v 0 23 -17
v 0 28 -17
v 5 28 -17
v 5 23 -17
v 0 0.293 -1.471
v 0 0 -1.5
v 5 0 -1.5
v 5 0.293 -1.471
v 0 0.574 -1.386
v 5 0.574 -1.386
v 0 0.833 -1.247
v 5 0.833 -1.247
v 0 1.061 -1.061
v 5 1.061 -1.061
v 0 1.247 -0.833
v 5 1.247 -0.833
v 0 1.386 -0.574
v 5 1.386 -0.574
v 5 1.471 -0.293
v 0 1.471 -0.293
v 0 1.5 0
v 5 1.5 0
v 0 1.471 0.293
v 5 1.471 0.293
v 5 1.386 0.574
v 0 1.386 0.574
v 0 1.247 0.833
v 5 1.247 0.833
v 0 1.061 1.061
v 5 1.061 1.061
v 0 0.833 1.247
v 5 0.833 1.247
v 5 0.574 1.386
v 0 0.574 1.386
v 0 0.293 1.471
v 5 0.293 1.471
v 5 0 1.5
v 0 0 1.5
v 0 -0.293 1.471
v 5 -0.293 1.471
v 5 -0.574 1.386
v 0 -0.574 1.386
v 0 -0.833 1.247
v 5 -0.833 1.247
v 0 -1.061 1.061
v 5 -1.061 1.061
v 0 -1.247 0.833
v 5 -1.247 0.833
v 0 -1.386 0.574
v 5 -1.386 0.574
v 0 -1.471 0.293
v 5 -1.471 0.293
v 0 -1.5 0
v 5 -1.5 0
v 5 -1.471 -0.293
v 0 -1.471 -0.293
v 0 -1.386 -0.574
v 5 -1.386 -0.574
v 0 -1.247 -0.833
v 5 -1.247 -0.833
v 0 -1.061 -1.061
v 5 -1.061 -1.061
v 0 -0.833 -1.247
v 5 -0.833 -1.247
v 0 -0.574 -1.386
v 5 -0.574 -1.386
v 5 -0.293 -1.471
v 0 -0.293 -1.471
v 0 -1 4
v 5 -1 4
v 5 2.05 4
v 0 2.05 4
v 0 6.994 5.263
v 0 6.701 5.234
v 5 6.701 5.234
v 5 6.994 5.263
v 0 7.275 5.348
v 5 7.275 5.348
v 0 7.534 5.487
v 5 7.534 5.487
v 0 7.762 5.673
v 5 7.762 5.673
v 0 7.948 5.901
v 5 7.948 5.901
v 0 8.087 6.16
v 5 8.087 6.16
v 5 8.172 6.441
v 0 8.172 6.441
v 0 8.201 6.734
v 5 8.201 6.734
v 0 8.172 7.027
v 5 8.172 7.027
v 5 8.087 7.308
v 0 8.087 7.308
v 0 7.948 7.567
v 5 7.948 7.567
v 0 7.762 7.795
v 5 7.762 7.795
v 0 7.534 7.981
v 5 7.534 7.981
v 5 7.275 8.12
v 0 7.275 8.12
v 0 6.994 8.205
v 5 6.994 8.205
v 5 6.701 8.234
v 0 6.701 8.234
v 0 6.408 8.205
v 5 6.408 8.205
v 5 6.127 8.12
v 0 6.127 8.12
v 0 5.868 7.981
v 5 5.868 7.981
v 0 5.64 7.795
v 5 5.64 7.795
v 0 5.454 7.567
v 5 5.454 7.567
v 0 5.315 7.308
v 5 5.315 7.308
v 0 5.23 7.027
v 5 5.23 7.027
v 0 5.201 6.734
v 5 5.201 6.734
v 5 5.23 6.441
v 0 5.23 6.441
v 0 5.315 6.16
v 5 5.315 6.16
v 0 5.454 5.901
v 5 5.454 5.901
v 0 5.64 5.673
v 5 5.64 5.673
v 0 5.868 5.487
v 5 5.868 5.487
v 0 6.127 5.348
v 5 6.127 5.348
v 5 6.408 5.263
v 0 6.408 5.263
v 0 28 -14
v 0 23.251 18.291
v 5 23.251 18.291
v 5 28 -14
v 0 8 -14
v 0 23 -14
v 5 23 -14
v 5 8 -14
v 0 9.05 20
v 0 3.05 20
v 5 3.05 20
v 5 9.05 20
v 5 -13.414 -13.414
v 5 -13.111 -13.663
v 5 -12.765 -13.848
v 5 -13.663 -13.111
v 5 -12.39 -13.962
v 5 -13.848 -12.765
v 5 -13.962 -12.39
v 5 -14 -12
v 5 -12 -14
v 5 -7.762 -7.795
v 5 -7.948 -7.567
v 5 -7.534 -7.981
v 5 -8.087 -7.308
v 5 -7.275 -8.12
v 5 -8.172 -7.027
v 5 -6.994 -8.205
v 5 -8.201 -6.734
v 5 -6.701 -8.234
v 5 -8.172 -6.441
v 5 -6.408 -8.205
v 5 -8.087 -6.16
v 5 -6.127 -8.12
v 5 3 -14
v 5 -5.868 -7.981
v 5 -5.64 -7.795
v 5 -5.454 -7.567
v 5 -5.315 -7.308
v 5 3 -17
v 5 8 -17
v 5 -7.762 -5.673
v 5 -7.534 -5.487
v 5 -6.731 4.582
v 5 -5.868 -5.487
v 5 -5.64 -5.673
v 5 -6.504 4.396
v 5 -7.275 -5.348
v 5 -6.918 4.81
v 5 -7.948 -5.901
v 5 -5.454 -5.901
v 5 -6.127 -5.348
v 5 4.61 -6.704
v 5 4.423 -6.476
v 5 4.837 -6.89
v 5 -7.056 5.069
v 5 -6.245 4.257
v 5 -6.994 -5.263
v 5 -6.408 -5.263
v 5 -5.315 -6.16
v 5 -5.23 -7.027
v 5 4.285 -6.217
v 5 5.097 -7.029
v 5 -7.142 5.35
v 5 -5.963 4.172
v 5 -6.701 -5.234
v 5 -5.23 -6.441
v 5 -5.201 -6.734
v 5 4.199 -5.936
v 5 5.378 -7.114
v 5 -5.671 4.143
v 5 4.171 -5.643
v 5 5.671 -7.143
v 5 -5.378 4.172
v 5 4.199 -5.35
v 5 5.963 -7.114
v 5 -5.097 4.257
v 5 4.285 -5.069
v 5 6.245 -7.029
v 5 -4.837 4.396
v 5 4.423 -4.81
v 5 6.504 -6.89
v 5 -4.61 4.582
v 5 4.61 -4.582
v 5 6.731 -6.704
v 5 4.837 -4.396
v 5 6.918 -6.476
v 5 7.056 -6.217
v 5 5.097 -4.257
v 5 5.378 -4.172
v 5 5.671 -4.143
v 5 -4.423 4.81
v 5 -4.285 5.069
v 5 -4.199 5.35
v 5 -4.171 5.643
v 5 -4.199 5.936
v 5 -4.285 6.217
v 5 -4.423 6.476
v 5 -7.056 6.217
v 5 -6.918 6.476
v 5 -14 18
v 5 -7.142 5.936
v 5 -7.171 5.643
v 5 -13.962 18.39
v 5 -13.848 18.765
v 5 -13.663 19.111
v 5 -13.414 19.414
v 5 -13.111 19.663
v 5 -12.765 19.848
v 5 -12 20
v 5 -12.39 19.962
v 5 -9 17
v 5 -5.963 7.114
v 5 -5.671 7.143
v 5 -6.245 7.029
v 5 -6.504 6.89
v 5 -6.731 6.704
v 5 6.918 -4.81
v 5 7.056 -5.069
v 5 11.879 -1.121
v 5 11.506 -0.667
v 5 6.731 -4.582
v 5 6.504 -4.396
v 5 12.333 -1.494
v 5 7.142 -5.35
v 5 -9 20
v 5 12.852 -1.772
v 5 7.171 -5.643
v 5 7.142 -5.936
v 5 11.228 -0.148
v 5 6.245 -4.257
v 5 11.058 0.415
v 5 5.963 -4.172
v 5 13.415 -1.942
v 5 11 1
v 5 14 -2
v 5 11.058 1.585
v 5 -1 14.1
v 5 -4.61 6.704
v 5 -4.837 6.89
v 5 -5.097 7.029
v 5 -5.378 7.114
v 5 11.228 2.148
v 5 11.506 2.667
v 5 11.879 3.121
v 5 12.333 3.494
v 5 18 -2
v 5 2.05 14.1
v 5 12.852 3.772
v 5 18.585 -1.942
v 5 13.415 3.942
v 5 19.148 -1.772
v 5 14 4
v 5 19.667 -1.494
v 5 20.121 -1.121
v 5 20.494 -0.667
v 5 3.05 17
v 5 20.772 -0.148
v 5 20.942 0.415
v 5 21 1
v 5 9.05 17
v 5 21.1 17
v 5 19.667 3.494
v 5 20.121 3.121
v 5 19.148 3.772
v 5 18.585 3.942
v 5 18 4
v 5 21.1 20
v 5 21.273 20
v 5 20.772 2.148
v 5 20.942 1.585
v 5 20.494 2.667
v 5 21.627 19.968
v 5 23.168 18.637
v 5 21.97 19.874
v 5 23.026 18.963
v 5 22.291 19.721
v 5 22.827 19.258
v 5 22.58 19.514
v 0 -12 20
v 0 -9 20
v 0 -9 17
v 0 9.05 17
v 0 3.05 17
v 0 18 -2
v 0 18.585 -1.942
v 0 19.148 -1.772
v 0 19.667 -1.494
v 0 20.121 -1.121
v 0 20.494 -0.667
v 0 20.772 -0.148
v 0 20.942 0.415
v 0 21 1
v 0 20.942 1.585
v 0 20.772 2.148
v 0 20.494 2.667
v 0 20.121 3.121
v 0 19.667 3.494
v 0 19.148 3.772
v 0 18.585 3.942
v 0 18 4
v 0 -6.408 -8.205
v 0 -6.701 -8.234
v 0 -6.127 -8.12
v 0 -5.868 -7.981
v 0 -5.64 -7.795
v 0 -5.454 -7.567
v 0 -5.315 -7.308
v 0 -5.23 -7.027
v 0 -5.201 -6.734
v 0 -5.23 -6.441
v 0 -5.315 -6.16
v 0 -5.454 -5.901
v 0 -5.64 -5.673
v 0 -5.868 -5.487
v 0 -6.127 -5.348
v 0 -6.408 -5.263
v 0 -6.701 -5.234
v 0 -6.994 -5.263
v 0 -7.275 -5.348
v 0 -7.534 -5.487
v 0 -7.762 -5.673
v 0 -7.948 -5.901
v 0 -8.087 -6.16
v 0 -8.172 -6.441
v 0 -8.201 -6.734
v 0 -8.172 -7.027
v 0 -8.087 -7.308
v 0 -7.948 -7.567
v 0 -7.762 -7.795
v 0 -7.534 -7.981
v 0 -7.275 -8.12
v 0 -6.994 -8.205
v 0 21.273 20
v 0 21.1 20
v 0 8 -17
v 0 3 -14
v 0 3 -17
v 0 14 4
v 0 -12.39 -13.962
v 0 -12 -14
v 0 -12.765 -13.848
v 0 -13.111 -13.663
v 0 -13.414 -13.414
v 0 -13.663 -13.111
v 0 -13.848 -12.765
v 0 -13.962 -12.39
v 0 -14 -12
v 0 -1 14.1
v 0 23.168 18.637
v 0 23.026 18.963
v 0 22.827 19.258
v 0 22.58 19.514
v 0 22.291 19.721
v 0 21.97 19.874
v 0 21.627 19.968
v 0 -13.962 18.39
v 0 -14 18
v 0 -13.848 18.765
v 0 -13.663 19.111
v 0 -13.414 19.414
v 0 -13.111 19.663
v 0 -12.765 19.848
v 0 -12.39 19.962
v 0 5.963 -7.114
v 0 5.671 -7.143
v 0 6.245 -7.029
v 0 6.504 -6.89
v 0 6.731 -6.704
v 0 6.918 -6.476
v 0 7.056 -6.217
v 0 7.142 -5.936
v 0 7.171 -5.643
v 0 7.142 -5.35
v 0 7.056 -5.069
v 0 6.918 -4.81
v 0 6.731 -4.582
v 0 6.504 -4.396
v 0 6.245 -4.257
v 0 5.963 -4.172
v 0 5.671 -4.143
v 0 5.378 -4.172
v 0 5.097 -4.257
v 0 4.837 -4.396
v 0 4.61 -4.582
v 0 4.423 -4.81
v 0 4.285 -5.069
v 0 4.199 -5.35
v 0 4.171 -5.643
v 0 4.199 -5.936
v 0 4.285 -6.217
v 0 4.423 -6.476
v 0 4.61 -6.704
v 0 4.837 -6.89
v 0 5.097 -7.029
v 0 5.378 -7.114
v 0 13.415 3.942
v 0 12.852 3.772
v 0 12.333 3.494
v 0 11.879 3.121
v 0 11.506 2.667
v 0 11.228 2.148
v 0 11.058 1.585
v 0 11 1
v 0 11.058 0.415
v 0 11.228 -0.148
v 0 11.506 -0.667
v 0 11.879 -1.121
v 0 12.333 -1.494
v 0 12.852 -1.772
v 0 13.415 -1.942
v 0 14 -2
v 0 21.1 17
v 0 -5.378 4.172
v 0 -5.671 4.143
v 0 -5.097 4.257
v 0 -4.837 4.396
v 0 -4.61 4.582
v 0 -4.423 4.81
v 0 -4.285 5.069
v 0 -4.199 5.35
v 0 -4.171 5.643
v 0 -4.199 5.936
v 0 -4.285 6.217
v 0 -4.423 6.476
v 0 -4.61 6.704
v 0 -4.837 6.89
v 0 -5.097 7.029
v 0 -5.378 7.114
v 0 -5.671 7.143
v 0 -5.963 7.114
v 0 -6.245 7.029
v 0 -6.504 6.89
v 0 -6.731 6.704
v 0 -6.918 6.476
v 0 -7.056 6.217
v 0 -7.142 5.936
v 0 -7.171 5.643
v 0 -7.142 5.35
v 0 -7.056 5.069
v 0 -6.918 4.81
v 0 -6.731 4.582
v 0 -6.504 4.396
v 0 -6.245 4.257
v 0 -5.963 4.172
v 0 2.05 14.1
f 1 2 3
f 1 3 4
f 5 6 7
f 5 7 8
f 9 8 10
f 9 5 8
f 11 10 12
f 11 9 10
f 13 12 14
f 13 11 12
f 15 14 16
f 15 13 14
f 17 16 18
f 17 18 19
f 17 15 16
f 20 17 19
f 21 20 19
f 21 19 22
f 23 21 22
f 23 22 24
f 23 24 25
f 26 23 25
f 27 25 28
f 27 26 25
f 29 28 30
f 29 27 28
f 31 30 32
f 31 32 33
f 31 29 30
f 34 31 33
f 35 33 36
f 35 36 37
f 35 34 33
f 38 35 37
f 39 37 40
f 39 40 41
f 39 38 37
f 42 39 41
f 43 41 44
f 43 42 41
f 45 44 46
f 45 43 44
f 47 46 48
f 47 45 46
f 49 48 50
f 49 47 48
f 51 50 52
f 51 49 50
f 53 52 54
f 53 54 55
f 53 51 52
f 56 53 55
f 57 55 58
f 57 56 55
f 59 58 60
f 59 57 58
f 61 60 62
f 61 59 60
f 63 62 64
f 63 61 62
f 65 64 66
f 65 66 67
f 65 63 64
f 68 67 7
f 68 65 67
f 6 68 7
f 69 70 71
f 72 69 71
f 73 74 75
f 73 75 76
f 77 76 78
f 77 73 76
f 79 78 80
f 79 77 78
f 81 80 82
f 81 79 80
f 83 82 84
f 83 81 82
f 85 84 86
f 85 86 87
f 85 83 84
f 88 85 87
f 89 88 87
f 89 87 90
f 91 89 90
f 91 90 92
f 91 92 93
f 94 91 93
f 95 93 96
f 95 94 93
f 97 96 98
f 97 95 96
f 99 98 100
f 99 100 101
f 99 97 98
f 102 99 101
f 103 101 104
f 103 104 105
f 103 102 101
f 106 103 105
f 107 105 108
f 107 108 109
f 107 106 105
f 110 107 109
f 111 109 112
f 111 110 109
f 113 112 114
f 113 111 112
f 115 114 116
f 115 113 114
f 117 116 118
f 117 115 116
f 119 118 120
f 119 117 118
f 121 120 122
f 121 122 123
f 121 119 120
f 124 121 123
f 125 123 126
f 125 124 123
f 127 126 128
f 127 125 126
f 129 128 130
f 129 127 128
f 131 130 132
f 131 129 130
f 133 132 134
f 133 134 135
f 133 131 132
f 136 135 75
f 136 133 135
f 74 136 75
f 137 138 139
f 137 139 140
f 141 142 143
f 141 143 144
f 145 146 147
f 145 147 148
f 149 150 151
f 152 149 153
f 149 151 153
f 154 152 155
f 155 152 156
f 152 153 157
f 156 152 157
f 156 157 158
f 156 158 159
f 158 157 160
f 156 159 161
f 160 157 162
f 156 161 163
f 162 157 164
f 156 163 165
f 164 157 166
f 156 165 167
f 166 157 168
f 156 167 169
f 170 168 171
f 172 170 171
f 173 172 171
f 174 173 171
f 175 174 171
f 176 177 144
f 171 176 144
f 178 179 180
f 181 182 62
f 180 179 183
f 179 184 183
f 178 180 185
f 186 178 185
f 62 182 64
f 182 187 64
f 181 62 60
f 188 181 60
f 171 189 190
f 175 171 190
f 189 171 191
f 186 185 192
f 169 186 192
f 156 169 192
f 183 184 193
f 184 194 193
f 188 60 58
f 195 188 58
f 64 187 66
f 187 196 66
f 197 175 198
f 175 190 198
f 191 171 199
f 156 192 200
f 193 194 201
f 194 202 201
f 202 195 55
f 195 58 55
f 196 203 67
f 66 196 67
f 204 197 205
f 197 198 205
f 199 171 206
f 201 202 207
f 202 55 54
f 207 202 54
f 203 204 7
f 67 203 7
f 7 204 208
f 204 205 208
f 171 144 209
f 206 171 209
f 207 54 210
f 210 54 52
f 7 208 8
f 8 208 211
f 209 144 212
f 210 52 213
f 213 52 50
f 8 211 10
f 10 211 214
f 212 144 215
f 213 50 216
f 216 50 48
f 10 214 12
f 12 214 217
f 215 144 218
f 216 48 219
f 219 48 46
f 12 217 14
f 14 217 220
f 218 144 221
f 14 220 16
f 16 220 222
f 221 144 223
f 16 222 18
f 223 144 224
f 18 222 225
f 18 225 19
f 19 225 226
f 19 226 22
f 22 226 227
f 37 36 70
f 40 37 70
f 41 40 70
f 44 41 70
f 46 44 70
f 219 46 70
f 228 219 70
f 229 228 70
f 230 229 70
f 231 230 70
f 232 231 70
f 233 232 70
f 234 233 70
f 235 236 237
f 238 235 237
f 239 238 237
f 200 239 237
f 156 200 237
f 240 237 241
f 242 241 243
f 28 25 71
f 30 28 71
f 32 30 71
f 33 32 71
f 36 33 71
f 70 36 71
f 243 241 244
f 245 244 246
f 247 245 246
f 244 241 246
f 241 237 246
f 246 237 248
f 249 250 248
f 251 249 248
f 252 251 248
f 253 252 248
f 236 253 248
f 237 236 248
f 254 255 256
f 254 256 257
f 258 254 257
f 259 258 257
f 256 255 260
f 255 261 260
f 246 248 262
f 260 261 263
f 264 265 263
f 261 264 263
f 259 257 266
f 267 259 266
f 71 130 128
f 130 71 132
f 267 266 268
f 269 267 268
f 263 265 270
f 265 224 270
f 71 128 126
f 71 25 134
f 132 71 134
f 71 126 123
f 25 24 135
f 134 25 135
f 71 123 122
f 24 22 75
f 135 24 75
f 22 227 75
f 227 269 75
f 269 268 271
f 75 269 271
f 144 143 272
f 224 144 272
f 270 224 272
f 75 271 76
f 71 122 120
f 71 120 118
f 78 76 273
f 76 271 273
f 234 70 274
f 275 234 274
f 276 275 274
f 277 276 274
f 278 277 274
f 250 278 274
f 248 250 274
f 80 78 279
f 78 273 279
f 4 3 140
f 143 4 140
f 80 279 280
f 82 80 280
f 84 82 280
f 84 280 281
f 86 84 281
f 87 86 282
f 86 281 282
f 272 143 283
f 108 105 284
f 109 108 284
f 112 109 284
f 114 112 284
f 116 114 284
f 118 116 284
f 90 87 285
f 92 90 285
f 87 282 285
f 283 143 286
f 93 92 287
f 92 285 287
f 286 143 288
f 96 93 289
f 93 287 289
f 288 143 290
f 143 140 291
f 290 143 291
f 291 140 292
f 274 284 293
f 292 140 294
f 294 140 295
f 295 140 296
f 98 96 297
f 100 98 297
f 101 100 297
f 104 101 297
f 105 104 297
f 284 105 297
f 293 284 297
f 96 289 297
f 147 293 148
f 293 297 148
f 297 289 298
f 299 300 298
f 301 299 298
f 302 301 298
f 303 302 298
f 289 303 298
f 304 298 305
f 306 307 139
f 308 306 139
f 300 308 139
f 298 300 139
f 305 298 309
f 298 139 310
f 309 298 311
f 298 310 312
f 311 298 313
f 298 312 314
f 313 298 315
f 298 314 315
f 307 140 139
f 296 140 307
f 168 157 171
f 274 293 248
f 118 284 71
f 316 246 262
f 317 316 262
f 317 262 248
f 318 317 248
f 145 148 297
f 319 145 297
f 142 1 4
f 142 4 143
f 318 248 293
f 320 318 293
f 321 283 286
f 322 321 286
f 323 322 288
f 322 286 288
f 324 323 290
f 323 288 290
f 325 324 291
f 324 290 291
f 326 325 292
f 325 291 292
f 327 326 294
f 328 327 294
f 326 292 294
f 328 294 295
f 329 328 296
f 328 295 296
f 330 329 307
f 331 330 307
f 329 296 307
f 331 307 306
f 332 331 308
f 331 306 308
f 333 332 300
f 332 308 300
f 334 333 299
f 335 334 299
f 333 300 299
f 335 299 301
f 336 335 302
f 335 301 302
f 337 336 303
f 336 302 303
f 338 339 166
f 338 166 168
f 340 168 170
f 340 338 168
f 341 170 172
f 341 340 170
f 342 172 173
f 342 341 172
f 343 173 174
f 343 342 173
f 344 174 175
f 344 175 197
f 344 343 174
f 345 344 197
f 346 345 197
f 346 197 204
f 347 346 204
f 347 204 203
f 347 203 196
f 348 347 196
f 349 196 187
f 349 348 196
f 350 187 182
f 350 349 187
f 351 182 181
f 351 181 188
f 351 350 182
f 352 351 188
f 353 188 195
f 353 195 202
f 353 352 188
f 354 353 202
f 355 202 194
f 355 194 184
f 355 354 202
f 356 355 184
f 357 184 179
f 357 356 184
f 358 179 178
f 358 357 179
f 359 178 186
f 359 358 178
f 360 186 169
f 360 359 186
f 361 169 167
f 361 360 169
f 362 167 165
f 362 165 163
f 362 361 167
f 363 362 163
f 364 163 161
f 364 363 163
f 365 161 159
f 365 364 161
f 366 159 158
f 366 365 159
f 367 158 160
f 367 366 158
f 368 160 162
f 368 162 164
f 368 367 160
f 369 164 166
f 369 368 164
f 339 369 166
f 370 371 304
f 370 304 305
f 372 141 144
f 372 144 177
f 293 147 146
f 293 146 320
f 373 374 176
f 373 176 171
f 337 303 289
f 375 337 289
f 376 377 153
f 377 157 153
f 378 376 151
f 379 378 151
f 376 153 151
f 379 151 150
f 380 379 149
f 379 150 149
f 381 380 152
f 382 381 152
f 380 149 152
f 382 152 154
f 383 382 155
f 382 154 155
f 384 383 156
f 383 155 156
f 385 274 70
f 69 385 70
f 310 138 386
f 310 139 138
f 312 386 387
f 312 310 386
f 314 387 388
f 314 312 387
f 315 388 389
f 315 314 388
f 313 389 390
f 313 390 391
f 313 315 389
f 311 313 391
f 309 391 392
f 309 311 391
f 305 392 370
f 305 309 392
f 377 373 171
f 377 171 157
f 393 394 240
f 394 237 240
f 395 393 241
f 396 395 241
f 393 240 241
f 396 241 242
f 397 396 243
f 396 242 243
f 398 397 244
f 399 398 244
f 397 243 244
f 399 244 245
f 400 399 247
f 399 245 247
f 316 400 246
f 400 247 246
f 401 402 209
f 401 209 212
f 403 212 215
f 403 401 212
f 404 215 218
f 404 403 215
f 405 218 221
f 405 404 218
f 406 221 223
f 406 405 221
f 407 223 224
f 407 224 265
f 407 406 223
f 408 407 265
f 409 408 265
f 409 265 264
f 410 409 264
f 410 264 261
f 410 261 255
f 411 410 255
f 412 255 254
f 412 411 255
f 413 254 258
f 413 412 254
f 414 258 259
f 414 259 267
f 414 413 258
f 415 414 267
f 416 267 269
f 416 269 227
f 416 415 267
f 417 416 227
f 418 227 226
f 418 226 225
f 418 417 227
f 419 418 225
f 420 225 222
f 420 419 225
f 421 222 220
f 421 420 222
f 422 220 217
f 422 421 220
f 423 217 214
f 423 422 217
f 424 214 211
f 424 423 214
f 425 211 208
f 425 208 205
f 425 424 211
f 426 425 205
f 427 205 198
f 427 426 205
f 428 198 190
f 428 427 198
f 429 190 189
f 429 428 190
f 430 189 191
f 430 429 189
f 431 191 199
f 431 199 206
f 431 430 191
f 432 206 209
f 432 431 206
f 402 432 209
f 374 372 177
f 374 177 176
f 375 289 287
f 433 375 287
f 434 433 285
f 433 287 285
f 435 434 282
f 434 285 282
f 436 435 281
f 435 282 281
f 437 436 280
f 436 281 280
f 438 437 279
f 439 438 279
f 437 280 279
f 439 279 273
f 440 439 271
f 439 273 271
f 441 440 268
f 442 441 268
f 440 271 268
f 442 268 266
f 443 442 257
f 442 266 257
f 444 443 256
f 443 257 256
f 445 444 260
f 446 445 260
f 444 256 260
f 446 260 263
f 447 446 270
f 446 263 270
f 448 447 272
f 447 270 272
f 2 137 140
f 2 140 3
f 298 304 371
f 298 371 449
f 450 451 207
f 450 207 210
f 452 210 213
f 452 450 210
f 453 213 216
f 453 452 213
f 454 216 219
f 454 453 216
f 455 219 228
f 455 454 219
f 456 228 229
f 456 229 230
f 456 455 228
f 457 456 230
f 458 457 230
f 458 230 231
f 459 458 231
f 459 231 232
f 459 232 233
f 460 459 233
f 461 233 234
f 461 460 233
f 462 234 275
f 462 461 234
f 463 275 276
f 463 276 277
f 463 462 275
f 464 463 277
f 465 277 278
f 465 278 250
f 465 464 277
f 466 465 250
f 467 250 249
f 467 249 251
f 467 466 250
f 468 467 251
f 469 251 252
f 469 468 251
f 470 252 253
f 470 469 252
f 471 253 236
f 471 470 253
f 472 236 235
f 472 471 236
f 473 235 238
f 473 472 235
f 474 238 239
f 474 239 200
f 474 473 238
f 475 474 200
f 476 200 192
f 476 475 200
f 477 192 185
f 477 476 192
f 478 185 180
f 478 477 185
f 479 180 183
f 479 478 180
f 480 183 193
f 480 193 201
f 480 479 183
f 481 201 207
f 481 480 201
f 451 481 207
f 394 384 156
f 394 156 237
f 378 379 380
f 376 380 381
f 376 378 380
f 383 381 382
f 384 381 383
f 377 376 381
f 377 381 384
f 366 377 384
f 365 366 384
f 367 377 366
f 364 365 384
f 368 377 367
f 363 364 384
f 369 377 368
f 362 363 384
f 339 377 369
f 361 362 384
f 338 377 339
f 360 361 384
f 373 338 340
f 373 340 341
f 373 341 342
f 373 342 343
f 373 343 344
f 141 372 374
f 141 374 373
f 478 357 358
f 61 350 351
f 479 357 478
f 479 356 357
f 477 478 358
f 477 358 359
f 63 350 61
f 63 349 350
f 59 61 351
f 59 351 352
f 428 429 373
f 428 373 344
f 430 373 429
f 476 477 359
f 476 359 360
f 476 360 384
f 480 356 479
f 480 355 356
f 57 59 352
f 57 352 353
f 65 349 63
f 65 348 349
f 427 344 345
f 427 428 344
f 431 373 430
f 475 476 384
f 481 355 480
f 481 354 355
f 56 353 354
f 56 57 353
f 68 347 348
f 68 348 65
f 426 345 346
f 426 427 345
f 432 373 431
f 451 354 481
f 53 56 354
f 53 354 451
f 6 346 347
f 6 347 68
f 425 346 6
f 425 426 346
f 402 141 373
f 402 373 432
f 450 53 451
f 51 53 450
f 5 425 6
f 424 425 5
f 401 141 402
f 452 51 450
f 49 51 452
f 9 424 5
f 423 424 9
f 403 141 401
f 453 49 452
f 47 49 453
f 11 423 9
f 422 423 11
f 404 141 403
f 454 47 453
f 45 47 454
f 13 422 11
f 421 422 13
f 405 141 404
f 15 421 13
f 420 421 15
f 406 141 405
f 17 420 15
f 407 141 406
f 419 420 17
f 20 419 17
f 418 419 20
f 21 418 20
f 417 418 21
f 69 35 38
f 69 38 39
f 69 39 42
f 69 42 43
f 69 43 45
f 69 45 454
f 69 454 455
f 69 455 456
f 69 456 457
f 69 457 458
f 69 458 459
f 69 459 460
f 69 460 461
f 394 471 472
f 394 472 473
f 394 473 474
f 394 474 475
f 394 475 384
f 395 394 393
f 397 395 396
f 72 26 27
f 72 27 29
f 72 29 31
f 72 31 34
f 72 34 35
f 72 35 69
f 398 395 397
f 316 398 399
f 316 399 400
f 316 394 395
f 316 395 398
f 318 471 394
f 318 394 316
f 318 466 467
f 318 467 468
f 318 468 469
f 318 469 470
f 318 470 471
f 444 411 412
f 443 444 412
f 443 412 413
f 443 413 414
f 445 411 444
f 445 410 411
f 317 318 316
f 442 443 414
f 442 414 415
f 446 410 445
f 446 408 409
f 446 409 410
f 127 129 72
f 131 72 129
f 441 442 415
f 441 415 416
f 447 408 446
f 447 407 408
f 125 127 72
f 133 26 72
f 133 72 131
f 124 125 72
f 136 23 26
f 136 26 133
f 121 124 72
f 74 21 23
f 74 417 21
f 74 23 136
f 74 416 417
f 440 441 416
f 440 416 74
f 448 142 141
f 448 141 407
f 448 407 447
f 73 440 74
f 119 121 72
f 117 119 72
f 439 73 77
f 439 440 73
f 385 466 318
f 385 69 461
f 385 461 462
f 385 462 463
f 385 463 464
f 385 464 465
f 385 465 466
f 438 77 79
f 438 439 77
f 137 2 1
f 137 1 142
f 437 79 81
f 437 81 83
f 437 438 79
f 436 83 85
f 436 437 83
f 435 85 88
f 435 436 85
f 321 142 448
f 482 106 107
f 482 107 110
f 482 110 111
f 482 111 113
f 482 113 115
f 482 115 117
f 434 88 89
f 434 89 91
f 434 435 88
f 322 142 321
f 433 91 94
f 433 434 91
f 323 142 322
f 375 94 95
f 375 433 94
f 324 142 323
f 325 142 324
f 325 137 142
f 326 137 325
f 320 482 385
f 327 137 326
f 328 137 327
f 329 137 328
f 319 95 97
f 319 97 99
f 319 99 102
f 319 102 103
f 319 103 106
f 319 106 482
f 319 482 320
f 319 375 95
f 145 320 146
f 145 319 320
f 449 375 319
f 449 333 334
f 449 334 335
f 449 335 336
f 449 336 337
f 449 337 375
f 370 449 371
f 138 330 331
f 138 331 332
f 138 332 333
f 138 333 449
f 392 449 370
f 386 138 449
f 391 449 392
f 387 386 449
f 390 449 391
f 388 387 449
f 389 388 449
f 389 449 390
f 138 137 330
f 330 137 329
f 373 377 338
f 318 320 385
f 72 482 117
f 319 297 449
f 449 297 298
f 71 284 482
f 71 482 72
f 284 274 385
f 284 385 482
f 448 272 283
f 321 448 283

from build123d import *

# Parameters (mm, degrees)
SKETCH1_R           = 1.5
BOSS_EXTRUDE1_DEPTH = 5
SKETCH2_W           = 3
SKETCH2_H           = 12.05
SKETCH2_W_2         = 10.1
SKETCH2_H_2         = 3.05
CUT_EXTRUDE1_DEPTH  = 35.770677301
CUT_EXTRUDE3_DEPTH  = 10
FILLET1_R           = 2


with BuildPart() as part:
    # Sketch1 → Boss-Extrude1 (new body)
    with BuildSketch(Plane(origin=(0, 0, 0), x_dir=(0, 0, -1), z_dir=(1, 0, 0))):
        Polygon((17, 28), (17, 23), (14, 23), (14, 8), (17, 8), (17, 3), (14, 3), (14, -14), (-20, -14), (-20, 23), (14, 28), align=None)
        with Locations((-6.733876165, 6.701112728)):
            Circle(SKETCH1_R, mode=Mode.SUBTRACT)
        with Locations((-5.643042298, -5.67063256)):
            Circle(SKETCH1_R, mode=Mode.SUBTRACT)
        with Locations((6.733876165, -6.701112728)):
            Circle(SKETCH1_R, mode=Mode.SUBTRACT)
        with Locations((5.643042298, 5.67063256)):
            Circle(SKETCH1_R, mode=Mode.SUBTRACT)
        Circle(SKETCH1_R, mode=Mode.SUBTRACT)
    extrude(amount=BOSS_EXTRUDE1_DEPTH)

    # Sketch2 → Cut-Extrude1 (cut, through all)
    with BuildSketch(Plane(origin=(5, 0, 0), x_dir=(0, 0, -1), z_dir=(1, 0, 0))):
        with Locations((-18.5, 15.075)):
            Rectangle(SKETCH2_W, SKETCH2_H)
        with Locations((-9.05, 0.525)):
            Rectangle(SKETCH2_W_2, SKETCH2_H_2)
        with Locations((-18.5, -2.975)):
            Rectangle(SKETCH2_W, SKETCH2_H)
    extrude(amount=-CUT_EXTRUDE1_DEPTH, mode=Mode.SUBTRACT)

    # Sketch4 → Cut-Extrude3 (cut)
    with BuildSketch(Plane(origin=(5, 0, 0), x_dir=(0, 0, -1), z_dir=(1, 0, 0))):
        with BuildLine():
            Line((-4, 18), (-4, 14))
            ThreePointArc((-4, 14), (-1, 11), (2, 14))
            Line((2, 14), (2, 18))
            ThreePointArc((2, 18), (-1, 21), (-4, 18))
        make_face()
    extrude(amount=-CUT_EXTRUDE3_DEPTH, mode=Mode.SUBTRACT)

    # Fillet1
    fillet1_edges = [part.edges().sort_by_distance(p)[0] for p in [
        (2.5, -14, -14),
        (2.5, -14, 20),
        (2.5, 23, 20),
    ]]
    fillet(fillet1_edges, radius=FILLET1_R)


solid = part.part
